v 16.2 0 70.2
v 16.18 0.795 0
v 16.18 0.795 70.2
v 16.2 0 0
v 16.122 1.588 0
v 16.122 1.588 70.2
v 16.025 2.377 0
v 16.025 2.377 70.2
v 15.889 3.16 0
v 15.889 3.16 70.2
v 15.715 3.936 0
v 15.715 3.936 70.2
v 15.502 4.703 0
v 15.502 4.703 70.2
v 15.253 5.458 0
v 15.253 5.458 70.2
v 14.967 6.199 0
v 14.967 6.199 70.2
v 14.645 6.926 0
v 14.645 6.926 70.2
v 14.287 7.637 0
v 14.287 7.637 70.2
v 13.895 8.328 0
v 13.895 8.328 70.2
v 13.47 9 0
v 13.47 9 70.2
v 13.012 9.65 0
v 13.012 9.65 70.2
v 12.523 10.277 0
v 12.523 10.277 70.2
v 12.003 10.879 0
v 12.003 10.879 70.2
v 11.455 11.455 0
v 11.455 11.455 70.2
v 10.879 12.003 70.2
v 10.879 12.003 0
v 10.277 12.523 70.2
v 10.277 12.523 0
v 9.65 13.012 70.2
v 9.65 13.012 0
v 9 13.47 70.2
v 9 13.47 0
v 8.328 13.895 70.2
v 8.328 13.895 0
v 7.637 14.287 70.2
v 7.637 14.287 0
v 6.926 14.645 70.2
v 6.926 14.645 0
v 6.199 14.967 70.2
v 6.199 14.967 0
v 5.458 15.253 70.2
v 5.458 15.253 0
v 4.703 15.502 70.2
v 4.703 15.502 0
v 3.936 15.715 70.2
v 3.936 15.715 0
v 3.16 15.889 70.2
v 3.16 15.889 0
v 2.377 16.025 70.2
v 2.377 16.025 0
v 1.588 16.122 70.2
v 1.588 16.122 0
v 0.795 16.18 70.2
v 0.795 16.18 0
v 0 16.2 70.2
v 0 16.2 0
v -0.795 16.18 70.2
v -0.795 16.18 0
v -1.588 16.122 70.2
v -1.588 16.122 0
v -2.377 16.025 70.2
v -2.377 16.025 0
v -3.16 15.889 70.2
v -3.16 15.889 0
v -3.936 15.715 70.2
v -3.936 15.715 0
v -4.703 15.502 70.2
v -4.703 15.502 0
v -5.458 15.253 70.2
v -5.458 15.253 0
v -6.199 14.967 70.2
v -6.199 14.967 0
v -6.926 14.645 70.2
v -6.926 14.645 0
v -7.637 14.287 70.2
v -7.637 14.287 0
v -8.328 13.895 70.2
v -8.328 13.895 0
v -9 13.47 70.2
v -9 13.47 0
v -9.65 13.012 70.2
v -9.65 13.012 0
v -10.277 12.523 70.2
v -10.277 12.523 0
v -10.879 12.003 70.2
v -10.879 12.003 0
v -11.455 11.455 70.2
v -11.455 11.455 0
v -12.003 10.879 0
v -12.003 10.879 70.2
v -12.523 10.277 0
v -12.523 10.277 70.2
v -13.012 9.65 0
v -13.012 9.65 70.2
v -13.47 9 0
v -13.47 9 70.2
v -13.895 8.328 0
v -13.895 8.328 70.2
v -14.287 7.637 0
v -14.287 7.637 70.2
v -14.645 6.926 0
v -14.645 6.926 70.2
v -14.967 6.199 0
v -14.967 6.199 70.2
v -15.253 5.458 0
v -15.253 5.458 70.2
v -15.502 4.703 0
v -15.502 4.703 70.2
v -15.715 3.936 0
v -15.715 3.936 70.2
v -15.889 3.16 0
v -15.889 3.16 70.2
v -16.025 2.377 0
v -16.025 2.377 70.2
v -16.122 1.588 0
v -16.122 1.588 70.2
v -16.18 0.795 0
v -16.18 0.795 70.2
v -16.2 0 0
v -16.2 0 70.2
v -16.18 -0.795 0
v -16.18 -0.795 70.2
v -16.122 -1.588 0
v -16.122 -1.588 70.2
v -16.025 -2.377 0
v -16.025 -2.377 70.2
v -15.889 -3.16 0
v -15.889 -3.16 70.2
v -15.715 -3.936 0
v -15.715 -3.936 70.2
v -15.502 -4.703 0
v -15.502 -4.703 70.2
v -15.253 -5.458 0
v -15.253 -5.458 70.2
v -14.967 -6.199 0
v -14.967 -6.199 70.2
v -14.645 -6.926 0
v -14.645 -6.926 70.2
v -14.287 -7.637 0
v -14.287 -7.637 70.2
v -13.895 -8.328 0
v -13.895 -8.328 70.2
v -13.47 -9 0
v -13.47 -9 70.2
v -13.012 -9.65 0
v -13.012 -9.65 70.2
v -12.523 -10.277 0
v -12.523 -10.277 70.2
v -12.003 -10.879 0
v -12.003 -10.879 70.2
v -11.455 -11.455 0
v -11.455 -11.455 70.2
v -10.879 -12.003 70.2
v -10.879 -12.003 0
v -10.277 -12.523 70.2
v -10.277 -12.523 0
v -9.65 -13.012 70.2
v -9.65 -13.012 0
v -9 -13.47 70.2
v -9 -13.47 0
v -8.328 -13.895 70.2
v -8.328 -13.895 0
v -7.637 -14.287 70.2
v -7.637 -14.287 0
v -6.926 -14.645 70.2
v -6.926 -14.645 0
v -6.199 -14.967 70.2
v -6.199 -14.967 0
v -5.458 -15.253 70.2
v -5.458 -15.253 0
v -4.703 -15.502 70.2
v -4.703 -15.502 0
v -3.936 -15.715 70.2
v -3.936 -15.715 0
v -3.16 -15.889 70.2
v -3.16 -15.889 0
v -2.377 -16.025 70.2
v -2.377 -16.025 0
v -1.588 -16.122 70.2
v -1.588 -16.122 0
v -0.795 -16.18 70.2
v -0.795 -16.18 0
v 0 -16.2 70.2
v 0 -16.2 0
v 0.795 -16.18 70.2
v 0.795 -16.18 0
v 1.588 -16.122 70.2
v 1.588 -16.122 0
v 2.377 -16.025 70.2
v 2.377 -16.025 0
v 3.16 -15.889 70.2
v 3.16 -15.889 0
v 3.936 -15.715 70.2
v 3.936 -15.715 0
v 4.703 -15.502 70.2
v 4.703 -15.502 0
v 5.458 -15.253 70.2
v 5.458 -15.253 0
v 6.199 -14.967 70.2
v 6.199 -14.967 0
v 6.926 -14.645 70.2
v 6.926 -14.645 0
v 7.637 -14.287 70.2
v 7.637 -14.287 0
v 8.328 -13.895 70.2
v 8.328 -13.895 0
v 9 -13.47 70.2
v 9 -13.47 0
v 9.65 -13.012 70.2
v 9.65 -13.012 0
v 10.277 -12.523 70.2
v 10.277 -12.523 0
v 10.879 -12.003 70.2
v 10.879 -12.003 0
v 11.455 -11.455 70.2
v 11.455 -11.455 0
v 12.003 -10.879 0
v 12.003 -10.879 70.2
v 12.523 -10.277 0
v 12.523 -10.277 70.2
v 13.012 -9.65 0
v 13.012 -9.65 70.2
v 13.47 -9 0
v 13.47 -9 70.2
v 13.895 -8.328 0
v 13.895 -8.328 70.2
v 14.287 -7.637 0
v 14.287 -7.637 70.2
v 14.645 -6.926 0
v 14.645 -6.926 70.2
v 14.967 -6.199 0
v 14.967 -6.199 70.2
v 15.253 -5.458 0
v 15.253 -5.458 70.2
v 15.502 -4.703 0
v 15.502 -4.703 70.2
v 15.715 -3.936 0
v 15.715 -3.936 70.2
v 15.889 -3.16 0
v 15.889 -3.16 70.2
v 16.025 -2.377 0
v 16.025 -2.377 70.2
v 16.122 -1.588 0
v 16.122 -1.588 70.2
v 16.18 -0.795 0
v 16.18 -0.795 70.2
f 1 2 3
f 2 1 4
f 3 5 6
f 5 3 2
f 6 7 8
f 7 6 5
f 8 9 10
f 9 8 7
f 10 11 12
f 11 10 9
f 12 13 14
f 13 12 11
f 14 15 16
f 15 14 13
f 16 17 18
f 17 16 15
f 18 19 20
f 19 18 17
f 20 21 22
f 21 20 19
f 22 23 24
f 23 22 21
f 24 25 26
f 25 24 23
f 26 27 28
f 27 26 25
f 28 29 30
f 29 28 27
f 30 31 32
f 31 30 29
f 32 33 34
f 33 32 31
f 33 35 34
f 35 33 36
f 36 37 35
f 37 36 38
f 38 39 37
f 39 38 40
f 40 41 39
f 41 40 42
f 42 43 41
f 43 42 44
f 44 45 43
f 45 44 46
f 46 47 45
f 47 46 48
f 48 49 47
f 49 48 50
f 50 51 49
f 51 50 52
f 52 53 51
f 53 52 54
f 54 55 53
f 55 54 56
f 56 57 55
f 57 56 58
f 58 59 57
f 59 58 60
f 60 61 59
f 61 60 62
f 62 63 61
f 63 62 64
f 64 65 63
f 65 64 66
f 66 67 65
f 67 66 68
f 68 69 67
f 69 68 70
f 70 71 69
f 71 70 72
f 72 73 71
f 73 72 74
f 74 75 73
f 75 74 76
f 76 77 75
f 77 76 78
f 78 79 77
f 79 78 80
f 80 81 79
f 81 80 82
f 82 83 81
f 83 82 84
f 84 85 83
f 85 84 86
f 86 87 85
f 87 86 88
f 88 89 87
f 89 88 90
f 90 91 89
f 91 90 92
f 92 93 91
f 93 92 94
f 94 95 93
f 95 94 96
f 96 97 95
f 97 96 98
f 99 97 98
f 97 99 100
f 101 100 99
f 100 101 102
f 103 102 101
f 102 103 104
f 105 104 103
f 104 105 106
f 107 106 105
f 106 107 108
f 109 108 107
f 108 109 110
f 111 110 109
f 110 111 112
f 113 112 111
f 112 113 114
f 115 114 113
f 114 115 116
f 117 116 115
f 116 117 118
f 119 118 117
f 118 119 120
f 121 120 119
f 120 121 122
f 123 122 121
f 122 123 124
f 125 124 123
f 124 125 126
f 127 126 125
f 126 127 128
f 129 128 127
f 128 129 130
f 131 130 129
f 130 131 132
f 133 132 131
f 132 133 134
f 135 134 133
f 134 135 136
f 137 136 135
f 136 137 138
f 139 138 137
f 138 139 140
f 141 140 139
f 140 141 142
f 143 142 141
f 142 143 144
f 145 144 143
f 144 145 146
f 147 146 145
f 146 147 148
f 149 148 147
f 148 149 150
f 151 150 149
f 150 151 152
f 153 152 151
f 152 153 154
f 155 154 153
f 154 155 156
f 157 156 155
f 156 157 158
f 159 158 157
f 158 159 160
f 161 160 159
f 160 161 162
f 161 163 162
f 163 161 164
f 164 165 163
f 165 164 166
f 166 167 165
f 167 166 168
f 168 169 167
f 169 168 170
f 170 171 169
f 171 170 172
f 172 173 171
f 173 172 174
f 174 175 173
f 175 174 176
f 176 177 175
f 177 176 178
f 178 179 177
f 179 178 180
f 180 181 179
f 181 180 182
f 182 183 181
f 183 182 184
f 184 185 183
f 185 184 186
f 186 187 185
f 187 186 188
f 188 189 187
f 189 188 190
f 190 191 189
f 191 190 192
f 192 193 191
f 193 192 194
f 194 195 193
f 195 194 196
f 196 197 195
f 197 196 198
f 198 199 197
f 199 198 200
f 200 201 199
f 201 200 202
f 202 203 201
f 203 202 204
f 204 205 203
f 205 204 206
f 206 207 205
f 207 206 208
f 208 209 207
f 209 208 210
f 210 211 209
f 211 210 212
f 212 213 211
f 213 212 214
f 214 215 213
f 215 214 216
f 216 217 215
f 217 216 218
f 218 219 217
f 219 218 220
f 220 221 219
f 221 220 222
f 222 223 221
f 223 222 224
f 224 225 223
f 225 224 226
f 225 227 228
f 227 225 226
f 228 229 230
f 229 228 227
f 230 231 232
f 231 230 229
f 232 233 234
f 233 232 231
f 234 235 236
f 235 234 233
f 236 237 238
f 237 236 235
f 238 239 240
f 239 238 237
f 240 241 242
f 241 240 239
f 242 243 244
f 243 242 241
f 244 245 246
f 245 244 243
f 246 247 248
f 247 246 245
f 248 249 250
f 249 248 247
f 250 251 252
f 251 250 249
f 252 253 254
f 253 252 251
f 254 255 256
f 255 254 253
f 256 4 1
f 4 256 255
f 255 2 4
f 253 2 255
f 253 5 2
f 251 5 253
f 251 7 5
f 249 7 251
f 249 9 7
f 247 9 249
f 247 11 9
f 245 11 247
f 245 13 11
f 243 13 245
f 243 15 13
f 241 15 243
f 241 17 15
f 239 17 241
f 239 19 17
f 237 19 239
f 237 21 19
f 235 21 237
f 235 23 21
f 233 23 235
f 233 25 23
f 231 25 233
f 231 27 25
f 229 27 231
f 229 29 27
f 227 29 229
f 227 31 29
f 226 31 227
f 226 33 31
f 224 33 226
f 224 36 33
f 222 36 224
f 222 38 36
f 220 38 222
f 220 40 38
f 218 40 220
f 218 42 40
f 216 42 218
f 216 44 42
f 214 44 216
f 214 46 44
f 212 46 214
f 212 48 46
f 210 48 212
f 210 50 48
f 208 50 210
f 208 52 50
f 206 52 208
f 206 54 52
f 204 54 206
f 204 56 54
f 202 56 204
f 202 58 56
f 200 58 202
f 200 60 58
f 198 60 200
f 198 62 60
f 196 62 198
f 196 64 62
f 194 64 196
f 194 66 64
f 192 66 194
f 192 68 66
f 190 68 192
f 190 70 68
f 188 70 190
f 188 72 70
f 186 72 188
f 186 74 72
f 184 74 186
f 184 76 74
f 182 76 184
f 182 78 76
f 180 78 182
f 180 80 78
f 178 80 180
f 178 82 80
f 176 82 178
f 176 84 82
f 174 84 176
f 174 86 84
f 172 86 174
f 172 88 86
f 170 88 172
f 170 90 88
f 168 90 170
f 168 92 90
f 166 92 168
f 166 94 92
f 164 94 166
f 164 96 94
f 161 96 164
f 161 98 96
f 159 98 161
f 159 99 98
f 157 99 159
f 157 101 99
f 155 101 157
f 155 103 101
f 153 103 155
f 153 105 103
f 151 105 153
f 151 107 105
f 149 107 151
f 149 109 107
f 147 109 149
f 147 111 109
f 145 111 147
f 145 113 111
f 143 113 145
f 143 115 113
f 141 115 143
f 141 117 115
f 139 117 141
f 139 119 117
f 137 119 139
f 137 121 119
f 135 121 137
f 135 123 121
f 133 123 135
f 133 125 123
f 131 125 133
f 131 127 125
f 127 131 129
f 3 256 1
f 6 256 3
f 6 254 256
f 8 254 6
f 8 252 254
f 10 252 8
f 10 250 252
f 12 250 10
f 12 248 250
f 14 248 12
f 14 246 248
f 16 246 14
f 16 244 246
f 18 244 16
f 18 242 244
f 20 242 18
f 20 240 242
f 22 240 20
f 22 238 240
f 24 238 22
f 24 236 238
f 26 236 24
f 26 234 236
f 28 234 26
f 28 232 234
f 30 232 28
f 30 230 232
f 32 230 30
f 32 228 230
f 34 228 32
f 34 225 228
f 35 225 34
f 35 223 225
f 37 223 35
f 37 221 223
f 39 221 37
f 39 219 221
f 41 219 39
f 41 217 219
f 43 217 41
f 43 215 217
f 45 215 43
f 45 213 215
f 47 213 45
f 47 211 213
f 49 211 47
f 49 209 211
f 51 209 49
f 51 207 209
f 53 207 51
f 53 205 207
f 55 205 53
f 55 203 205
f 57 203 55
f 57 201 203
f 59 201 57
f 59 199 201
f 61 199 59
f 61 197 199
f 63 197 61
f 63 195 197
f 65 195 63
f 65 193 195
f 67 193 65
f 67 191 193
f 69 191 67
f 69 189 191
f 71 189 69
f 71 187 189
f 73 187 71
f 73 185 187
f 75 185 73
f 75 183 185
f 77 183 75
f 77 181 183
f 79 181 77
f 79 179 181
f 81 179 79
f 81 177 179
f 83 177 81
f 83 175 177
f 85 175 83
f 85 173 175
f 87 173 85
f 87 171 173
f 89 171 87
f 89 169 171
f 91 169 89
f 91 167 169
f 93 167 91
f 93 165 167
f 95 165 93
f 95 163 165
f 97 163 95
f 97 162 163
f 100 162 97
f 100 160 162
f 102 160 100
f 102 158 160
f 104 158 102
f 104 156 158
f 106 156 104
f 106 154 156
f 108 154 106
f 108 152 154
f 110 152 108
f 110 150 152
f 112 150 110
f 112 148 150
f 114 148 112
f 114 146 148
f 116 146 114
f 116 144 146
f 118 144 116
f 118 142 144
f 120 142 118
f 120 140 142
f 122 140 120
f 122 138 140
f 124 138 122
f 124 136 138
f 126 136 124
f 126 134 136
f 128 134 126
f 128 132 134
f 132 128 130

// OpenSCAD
$fn = 128;

height = 70.2;
diameter = 32.4;

cylinder(h = height, d = diameter);
